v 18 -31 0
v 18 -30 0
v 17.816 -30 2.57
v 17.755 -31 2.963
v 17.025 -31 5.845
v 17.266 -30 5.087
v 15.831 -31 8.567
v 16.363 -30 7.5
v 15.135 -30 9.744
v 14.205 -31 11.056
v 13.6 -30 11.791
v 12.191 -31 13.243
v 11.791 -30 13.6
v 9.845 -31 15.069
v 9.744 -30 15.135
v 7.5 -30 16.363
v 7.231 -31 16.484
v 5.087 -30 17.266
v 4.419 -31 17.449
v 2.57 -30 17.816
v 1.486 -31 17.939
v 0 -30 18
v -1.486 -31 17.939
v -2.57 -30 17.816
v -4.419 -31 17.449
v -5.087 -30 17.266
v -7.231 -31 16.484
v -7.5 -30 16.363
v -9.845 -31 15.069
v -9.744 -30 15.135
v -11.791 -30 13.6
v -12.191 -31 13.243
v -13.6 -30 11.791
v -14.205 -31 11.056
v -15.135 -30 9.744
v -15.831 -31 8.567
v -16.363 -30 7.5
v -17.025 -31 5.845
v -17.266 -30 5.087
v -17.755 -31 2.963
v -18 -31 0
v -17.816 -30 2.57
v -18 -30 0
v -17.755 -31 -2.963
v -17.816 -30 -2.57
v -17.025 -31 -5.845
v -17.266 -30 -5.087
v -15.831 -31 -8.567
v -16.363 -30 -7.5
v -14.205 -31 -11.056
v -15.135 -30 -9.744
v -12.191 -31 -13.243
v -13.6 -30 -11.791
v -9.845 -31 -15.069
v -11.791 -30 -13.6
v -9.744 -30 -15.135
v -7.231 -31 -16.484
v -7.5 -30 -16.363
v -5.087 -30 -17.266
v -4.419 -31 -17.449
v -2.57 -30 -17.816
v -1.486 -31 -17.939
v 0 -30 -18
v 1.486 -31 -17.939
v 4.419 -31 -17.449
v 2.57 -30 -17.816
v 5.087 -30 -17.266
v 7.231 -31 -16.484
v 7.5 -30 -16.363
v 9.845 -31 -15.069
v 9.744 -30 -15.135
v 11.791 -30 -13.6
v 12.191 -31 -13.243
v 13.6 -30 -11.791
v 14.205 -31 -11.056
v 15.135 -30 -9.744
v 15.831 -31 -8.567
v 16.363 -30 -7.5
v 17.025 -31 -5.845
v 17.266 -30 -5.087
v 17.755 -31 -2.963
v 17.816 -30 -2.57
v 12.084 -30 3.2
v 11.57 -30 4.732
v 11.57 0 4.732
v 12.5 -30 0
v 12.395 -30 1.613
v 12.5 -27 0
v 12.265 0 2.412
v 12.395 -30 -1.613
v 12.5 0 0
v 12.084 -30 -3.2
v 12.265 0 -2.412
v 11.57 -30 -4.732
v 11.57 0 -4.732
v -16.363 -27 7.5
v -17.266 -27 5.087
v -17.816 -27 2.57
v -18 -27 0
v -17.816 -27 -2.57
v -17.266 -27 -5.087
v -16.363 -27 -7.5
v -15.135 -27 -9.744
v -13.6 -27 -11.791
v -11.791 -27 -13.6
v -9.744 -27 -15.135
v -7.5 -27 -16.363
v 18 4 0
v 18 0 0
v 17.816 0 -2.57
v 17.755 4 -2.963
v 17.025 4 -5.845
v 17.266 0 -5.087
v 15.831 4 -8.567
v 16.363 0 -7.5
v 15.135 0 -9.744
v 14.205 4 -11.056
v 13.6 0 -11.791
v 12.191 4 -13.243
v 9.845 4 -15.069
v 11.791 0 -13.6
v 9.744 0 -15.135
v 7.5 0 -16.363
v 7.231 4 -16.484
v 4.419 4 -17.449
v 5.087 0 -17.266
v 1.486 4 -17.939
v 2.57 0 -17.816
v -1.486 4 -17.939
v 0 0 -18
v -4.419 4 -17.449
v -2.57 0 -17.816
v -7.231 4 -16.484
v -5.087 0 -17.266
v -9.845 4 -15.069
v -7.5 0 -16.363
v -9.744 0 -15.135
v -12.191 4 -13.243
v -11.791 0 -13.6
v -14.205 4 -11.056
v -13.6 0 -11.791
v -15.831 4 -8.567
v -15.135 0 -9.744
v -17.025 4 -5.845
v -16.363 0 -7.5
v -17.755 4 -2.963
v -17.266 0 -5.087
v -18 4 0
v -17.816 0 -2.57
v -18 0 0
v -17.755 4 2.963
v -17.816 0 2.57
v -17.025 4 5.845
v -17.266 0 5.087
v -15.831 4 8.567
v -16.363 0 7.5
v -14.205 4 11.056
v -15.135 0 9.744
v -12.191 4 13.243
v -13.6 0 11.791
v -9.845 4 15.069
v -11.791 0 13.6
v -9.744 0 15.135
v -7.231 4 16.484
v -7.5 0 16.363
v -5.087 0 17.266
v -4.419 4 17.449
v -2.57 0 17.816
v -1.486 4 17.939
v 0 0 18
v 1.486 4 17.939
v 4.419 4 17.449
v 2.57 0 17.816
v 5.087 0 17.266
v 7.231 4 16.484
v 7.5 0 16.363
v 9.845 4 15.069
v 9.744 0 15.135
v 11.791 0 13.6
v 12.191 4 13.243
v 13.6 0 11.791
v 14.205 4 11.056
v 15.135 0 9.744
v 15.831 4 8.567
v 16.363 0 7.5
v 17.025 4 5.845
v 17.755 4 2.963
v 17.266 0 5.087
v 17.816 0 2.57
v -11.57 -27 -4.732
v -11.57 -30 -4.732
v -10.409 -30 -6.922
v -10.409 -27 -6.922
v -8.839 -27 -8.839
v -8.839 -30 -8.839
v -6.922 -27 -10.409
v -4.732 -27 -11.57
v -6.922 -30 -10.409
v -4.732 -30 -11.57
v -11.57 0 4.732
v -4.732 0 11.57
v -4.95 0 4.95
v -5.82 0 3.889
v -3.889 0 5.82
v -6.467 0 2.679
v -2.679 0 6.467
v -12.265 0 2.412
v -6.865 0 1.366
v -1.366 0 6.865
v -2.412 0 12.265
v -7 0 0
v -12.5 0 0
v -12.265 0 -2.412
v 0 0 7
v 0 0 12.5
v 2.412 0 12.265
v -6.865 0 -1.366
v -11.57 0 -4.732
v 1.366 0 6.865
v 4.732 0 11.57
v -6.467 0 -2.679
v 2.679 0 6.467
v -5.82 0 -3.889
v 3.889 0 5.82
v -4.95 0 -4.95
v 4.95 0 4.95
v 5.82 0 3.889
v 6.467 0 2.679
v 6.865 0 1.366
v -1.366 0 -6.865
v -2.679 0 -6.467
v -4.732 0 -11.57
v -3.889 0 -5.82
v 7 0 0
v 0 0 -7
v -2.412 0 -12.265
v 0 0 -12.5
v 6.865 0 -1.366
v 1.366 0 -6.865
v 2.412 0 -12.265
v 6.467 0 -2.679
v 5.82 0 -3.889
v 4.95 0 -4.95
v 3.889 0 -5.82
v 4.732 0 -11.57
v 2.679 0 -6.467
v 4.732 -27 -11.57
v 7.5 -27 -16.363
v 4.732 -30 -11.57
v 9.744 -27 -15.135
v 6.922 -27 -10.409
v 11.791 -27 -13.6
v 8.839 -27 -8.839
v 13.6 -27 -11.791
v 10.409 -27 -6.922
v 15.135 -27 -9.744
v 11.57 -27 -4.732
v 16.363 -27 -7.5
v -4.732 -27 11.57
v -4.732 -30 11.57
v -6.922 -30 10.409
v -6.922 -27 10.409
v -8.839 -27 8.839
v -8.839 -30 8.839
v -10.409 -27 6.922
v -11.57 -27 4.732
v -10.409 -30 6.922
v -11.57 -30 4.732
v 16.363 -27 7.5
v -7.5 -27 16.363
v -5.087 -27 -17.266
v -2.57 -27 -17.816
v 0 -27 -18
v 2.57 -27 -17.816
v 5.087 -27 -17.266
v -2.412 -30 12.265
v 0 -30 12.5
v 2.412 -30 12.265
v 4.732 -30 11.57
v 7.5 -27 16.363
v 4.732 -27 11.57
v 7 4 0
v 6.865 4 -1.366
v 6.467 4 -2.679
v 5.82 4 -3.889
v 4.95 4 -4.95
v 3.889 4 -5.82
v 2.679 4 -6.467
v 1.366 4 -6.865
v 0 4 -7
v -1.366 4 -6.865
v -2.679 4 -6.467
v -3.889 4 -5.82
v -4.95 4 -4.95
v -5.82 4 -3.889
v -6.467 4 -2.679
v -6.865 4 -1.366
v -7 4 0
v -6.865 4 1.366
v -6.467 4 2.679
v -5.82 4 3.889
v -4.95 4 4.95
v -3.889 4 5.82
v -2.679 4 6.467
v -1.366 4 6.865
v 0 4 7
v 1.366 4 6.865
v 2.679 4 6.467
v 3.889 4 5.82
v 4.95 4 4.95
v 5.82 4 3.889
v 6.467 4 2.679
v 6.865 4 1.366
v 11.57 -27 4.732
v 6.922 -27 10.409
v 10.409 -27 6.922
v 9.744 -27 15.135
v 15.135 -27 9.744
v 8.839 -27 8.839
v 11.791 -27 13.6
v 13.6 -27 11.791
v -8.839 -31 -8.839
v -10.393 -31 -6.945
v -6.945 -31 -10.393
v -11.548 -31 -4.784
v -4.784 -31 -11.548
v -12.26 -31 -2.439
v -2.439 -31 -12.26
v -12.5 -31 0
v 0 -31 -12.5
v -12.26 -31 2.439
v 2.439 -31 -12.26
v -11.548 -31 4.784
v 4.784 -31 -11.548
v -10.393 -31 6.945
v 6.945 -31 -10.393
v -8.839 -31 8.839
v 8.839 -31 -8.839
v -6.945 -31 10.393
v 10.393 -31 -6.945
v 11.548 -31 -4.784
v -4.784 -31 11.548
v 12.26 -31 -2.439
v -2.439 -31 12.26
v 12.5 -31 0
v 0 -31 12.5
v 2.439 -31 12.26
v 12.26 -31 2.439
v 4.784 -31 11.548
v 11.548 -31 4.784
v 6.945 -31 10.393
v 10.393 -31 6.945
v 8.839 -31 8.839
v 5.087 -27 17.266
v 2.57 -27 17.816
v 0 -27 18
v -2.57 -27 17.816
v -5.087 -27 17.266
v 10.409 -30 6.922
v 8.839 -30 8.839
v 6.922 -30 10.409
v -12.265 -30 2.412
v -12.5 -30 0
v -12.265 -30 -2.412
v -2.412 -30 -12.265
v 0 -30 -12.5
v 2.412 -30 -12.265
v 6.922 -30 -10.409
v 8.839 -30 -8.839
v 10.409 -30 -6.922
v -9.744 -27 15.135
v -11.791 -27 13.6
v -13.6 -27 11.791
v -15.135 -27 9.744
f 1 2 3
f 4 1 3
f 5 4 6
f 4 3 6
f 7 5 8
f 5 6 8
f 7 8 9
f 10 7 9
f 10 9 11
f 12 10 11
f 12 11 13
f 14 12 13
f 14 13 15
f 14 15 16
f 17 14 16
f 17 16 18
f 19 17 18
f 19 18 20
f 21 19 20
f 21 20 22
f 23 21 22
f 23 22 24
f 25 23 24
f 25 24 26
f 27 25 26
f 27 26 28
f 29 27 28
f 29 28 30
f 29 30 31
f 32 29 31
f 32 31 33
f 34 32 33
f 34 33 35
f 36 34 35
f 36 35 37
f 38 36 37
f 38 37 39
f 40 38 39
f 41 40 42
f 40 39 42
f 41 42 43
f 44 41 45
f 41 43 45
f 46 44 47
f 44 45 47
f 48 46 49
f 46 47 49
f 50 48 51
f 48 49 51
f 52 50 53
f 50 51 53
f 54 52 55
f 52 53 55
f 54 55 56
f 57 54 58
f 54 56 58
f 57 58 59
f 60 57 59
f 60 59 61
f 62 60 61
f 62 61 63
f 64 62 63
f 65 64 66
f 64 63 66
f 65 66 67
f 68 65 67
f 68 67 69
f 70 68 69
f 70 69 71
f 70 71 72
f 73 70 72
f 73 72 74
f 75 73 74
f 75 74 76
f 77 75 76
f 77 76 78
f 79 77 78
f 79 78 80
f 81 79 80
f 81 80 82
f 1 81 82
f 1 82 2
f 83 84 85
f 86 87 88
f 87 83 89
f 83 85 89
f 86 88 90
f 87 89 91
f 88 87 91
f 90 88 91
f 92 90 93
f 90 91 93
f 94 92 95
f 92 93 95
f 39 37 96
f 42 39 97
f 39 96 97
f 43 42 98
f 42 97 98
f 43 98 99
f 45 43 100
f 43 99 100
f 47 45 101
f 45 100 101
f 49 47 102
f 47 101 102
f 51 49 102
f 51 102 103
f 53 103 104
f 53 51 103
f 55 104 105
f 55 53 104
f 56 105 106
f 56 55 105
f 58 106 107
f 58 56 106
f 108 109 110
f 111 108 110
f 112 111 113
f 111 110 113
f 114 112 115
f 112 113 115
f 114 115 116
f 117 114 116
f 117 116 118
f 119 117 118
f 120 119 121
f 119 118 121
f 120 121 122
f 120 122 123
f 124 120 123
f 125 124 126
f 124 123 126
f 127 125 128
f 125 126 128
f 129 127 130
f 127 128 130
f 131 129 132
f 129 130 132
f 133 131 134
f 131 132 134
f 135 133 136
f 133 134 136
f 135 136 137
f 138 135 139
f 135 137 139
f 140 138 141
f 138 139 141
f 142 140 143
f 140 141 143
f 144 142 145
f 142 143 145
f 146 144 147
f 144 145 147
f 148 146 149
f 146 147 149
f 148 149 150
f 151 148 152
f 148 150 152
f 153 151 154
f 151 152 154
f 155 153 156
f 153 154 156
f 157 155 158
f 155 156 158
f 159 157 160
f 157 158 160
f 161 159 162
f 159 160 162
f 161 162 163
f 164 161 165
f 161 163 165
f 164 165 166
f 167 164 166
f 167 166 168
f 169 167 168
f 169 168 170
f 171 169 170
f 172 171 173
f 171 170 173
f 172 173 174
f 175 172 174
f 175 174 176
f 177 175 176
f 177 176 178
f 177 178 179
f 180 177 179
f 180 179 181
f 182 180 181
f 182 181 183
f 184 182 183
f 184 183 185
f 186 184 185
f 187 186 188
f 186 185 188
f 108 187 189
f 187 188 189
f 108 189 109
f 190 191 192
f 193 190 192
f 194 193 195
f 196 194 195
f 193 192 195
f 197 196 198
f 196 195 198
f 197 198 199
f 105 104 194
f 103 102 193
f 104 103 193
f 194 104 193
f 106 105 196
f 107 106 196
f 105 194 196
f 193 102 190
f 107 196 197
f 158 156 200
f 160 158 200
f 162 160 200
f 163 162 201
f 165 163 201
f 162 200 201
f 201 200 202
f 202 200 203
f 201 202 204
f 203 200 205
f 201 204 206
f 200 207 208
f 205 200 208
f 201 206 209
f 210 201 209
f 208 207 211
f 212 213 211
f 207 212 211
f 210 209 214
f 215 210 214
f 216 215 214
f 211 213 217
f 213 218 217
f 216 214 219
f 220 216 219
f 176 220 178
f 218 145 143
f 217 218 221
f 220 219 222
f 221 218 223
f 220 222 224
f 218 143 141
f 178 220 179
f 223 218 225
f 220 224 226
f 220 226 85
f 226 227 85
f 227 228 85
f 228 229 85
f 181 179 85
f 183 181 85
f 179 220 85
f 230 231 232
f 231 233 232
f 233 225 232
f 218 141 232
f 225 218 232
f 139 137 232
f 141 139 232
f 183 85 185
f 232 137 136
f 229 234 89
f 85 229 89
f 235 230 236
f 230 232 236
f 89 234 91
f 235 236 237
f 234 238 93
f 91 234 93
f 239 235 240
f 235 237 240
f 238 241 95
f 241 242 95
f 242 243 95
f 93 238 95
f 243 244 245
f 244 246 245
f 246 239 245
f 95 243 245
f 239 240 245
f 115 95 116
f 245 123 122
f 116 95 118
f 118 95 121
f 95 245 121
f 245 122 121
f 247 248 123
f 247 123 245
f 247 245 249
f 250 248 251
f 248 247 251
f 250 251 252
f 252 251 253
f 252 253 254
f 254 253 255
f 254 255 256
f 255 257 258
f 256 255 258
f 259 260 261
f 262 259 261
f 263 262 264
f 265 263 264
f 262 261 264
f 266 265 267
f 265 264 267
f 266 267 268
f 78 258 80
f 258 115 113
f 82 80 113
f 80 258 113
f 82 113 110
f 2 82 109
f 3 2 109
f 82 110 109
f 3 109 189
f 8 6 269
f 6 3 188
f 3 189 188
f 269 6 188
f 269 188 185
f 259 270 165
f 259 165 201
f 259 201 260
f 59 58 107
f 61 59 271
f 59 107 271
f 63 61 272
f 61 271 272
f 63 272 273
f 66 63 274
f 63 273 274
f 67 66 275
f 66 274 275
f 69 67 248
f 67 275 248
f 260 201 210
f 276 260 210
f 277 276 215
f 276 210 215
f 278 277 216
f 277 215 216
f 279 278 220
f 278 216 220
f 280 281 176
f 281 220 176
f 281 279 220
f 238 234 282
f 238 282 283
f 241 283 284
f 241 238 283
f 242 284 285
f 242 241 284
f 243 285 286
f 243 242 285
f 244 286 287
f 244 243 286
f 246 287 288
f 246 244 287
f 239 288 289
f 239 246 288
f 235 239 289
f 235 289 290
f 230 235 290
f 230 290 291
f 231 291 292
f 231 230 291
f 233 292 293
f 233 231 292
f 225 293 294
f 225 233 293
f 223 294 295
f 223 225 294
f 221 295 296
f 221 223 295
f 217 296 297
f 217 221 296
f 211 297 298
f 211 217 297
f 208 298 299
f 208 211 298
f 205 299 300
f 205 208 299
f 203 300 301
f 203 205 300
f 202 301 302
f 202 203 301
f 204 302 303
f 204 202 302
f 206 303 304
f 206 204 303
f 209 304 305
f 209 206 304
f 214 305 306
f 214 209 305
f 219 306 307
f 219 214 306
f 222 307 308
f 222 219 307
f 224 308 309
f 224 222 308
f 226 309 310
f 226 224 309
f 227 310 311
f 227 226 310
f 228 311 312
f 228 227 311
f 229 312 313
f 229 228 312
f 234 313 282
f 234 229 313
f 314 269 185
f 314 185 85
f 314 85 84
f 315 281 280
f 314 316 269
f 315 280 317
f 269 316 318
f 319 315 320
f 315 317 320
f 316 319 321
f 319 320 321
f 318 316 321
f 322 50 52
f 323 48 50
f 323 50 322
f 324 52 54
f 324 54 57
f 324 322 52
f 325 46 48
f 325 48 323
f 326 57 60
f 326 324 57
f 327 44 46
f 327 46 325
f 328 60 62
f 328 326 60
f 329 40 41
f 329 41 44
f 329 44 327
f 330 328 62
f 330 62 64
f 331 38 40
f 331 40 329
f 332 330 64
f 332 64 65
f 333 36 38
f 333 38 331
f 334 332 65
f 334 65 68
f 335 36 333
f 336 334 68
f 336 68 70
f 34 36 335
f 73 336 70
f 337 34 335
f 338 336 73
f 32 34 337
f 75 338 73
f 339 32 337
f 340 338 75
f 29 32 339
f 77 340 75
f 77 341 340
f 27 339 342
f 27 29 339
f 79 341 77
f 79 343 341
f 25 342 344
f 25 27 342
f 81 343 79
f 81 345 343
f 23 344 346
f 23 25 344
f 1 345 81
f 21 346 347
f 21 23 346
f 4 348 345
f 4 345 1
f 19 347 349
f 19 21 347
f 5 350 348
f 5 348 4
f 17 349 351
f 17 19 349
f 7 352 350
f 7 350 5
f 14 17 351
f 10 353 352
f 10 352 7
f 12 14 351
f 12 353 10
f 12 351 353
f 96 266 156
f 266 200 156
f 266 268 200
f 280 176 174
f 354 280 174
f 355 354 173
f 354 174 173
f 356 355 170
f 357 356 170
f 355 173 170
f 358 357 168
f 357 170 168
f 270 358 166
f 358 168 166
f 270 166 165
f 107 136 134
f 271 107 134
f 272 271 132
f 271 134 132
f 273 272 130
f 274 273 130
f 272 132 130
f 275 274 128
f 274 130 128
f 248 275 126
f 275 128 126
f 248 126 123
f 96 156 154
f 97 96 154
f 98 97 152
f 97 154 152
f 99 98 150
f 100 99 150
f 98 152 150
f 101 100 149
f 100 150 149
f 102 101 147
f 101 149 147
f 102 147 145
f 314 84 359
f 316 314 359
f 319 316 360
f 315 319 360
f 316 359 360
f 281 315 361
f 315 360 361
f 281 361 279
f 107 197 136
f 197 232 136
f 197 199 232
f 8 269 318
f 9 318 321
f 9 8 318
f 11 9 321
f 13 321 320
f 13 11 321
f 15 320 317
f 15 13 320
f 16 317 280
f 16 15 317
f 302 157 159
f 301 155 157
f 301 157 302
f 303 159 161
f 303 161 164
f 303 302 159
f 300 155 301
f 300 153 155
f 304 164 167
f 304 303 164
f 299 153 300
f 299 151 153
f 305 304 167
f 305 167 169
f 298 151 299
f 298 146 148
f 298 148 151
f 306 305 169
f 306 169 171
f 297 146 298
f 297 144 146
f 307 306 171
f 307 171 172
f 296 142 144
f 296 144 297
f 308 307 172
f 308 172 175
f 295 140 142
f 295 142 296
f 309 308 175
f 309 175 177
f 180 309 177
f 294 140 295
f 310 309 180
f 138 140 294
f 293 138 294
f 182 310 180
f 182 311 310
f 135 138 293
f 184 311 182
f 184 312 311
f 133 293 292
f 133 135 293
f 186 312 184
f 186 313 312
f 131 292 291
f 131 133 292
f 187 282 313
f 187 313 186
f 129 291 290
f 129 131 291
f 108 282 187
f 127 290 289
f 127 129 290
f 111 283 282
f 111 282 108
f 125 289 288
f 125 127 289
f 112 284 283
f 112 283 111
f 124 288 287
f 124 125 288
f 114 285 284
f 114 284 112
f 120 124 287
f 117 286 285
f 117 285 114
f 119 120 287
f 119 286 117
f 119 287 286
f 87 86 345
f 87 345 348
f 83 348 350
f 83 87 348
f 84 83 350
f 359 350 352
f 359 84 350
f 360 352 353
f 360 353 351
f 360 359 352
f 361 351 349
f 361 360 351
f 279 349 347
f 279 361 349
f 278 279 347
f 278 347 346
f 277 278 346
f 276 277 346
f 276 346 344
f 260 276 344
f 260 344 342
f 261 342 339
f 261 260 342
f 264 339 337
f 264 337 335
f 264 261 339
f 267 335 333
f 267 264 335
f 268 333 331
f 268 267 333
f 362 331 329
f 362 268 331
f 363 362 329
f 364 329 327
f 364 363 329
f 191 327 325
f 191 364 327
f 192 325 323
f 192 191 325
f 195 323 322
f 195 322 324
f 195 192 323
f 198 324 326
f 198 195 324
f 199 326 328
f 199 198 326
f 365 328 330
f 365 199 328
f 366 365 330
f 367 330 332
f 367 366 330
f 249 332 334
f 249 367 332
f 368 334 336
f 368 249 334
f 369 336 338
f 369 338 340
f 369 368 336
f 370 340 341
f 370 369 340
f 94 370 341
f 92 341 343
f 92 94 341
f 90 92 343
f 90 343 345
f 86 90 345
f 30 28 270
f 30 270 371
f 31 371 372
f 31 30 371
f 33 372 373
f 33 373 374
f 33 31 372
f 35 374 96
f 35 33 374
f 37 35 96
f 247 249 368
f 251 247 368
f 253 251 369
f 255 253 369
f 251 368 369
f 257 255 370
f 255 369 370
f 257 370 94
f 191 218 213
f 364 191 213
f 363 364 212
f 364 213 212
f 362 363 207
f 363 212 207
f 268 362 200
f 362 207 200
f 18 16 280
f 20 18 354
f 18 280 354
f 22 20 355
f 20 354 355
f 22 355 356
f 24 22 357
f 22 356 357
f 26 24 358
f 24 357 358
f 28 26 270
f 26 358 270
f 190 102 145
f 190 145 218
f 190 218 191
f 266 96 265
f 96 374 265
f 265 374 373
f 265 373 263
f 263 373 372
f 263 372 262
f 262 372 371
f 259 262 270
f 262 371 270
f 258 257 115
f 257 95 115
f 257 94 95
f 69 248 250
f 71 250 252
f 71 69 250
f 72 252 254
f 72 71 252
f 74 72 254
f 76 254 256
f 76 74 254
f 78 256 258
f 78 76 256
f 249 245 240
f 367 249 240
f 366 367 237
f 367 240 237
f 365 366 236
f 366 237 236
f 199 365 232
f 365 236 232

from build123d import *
from build123d.topology import SkipClean

# Parameters (mm, degrees)
SKETCH1_R                = 18
SKETCH1_R_2              = 7
BOSS_EXTRUDE1_DEPTH      = 4
BOSS_EXTRUDE2_START      = 30
BOSS_EXTRUDE2_DEPTH      = 30
BOSS_EXTRUDE3_DEPTH      = 1
BOSS_EXTRUDE3_DEPTH_BACK = 3
SKETCH3_R                = 18
SKETCH3_R_2              = 12.5


with BuildPart() as part:
    # Sketch1 → Boss-Extrude1 (new body)
    with BuildSketch(Plane(origin=(0, 0, 0), x_dir=(1, 0, 0), z_dir=(0, 1, 0))):
        Circle(SKETCH1_R)
        Circle(SKETCH1_R_2, mode=Mode.SUBTRACT)
    extrude(amount=BOSS_EXTRUDE1_DEPTH)

    # Sketch2 → Boss-Extrude2 (add)
    with SkipClean():  # the faces are left unmerged after this step: merging them gives an invalid solid
        with BuildSketch(Plane.XZ.offset(BOSS_EXTRUDE2_START)):
            with BuildLine():
                Line((4.732447384, 11.569526428), (7.5, 16.363068172))
                ThreePointArc((7.5, 16.363068172), (0, 18), (-7.5, 16.363068172))
                Line((-7.5, 16.363068172), (-4.732447384, 11.569526428))
                ThreePointArc((-4.732447384, 11.569526428), (0, 12.5), (4.732447384, 11.569526428))
            make_face()
            with BuildLine():
                Line((11.569526428, -4.732447384), (16.363068172, -7.5))
                ThreePointArc((16.363068172, -7.5), (18, 0), (16.363068172, 7.5))
                Line((16.363068172, 7.5), (11.569526428, 4.732447384))
                ThreePointArc((11.569526428, 4.732447384), (12.5, 0), (11.569526428, -4.732447384))
            make_face()
            with BuildLine():
                Line((-4.732447384, -11.569526428), (-7.5, -16.363068172))
                ThreePointArc((-7.5, -16.363068172), (0, -18), (7.5, -16.363068172))
                Line((7.5, -16.363068172), (4.732447384, -11.569526428))
                ThreePointArc((4.732447384, -11.569526428), (0, -12.5), (-4.732447384, -11.569526428))
            make_face()
            with BuildLine():
                Line((-11.569526428, 4.732447384), (-16.363068172, 7.5))
                ThreePointArc((-16.363068172, 7.5), (-18, 0), (-16.363068172, -7.5))
                Line((-16.363068172, -7.5), (-11.569526428, -4.732447384))
                ThreePointArc((-11.569526428, -4.732447384), (-12.5, 0), (-11.569526428, 4.732447384))
            make_face()
        extrude(amount=-BOSS_EXTRUDE2_DEPTH)

    # Sketch3 → Boss-Extrude3 (add, two sides: drawn at the far end of the back side and taken through both)
    with SkipClean():  # the faces are left unmerged after this step: merging them gives an invalid solid
        with BuildSketch(Plane.XZ.offset(30).offset(-BOSS_EXTRUDE3_DEPTH_BACK)):
            Circle(SKETCH3_R)
            Circle(SKETCH3_R_2, mode=Mode.SUBTRACT)
        extrude(amount=BOSS_EXTRUDE3_DEPTH + BOSS_EXTRUDE3_DEPTH_BACK)


solid = part.part
